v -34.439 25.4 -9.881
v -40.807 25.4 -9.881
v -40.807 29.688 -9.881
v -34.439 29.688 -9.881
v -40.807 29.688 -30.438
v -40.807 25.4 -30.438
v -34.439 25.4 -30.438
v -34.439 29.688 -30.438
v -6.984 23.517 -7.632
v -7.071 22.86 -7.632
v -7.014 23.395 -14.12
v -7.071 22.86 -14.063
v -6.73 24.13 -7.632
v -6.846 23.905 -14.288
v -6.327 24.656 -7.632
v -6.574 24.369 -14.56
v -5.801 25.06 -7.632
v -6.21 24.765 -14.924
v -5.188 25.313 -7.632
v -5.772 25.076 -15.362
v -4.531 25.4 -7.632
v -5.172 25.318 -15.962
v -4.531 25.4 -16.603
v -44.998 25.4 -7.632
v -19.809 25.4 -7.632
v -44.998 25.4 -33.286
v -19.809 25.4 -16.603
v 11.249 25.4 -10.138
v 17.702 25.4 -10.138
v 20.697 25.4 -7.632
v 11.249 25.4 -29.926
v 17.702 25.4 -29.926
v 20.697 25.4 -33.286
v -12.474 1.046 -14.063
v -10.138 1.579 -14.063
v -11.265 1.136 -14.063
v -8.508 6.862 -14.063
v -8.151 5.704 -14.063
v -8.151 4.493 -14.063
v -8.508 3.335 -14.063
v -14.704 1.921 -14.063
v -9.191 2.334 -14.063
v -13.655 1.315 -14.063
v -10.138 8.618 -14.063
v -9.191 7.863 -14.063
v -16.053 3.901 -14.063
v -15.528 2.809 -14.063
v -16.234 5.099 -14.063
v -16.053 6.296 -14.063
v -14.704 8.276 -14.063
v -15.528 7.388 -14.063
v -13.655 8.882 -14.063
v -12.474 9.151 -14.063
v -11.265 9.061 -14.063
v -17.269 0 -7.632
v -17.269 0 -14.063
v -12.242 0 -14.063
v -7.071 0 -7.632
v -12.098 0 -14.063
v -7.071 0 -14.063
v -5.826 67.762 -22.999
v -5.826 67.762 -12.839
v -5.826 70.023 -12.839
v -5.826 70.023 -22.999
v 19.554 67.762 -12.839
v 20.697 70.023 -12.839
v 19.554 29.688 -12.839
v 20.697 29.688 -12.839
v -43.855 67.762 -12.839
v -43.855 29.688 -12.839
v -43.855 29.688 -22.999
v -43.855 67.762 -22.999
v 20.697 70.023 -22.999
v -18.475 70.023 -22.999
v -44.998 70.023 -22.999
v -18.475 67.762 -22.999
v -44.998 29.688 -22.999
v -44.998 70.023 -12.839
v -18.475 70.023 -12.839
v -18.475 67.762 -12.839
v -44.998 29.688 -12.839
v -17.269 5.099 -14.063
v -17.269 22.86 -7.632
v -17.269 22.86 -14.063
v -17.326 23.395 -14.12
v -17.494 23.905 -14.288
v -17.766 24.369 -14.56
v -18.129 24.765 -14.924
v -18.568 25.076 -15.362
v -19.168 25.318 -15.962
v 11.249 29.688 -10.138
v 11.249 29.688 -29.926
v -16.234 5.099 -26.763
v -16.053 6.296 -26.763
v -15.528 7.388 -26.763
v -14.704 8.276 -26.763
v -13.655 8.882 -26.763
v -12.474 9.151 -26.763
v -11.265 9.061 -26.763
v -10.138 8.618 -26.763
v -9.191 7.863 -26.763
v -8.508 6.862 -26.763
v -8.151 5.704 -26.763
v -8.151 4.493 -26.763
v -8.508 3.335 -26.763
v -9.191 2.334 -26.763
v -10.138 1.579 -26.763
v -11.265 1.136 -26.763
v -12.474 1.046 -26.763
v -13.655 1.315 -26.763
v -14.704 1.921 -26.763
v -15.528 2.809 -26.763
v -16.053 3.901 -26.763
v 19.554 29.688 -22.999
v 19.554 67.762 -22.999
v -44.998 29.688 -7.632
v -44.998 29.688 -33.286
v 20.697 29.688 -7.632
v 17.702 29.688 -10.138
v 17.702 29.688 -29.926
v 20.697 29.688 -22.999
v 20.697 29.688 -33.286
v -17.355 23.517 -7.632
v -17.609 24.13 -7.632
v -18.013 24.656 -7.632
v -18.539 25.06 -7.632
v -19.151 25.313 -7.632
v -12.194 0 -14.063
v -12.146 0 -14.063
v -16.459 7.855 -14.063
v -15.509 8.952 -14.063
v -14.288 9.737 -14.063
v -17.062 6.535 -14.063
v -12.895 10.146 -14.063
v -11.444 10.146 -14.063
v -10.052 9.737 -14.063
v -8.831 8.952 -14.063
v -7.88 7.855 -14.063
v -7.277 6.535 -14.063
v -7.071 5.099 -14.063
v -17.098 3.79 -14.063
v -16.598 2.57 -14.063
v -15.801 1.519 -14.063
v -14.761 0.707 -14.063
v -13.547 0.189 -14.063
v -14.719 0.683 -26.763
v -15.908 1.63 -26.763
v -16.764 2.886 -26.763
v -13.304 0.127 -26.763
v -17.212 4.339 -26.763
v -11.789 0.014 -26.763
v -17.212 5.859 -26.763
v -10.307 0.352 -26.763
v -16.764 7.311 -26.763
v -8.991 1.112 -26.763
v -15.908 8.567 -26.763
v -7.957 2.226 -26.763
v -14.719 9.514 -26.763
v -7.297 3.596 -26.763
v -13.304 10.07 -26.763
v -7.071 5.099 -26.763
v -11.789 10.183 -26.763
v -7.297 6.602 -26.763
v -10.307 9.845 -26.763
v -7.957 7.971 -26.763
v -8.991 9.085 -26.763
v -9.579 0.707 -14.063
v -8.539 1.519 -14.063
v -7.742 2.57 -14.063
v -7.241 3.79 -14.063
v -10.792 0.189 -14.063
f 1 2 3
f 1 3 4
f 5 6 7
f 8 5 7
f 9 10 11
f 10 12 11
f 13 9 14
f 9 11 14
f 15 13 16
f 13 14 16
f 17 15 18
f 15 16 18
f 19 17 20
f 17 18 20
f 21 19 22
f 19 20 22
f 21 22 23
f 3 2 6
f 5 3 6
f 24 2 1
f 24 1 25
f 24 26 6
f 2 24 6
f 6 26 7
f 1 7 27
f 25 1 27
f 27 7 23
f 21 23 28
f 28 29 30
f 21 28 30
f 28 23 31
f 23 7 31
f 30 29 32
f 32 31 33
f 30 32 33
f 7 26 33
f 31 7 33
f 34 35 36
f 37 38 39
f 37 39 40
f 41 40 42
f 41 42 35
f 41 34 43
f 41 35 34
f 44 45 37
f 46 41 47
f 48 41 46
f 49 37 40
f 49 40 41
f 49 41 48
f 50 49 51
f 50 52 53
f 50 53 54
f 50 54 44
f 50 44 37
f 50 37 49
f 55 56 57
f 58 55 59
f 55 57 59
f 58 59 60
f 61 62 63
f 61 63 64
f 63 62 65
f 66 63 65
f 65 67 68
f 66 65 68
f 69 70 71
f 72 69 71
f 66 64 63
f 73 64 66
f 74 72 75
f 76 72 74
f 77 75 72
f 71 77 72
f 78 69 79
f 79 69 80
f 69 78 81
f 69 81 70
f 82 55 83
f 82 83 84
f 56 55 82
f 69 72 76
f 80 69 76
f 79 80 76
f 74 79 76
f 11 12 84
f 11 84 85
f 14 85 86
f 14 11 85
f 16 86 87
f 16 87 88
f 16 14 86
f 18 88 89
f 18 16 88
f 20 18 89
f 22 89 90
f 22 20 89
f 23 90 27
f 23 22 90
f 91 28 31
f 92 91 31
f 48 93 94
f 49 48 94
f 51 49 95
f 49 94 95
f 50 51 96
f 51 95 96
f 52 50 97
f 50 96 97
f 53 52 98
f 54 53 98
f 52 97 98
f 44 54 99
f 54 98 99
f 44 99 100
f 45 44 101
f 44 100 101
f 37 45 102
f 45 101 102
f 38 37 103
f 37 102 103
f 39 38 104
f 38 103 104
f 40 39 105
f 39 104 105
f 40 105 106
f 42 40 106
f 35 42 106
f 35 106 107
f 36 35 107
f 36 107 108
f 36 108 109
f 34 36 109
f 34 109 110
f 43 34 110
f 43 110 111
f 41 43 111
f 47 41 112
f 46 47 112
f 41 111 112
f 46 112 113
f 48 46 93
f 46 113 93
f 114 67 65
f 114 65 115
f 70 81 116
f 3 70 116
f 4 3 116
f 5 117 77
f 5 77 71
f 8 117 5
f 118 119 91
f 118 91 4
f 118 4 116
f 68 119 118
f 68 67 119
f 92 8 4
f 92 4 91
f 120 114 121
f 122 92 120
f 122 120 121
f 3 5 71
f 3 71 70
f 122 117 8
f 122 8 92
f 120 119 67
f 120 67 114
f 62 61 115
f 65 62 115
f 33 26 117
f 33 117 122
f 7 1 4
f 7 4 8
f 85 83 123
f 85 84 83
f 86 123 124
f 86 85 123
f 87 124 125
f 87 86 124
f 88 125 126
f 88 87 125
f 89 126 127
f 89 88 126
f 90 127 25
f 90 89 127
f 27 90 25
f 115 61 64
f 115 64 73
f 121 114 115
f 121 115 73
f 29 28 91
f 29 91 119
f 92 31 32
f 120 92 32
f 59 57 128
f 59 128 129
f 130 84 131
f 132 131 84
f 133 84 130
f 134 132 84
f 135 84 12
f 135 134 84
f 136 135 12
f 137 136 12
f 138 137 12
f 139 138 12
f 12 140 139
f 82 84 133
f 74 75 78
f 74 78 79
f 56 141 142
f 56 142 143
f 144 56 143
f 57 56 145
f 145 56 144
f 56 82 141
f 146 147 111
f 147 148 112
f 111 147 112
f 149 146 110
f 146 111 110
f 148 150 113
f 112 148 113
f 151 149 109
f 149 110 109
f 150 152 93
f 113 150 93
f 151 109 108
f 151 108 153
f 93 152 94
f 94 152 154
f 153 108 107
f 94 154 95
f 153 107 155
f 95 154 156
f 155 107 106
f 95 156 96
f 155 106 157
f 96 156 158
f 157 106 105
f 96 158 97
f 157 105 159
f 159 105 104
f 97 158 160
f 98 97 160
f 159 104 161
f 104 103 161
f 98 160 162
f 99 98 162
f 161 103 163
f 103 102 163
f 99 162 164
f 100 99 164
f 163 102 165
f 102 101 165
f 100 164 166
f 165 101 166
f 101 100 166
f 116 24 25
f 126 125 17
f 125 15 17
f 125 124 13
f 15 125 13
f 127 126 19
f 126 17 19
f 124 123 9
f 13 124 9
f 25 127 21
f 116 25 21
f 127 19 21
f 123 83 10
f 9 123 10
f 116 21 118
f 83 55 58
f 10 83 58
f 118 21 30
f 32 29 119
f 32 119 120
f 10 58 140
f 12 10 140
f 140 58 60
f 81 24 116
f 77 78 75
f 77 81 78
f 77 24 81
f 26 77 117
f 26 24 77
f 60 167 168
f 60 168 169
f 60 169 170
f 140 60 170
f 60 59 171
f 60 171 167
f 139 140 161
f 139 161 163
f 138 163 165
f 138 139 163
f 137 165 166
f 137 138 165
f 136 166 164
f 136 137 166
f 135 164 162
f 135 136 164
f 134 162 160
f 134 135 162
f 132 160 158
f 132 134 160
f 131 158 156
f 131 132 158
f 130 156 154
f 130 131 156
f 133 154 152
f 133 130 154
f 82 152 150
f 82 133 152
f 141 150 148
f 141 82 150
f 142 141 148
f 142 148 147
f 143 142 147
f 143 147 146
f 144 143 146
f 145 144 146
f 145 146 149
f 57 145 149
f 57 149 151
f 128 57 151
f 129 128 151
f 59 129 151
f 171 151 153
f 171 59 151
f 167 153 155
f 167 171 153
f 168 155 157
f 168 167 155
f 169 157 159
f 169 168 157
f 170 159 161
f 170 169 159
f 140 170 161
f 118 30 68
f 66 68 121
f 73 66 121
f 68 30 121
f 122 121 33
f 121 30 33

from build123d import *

# Parameters (mm, degrees)
SKETCH6_W            = 10.1981
SKETCH6_H            = 6.43128
BOSS_EXTRUDE3_DEPTH  = 25.4
SKETCH8_R            = 5.09905
BOSS_EXTRUDE5_DEPTH  = 12.7
SKETCH11_W           = 65.69456
SKETCH11_H           = 25.654
SKETCH11_W_2         = 6.368021248
SKETCH11_H_2         = 20.557169264
SKETCH11_W_3         = 6.453498043
SKETCH11_H_3         = 19.787878106
BOSS_EXTRUDE10_DEPTH = 4.28752
SKETCH16_W           = 1.143
SKETCH16_H           = 10.16
BOSS_EXTRUDE11_DEPTH = 38.0746
SKETCH17_W           = 26.52268
SKETCH17_H           = 10.16
BOSS_EXTRUDE12_DEPTH = 2.2606
FILLET2_R            = 2.54
FILLET3_R            = 2.54
FILLET4_R            = 2.54
SKETCH19_R           = 4.064
CUT_EXTRUDE1_DEPTH   = 12.7


with BuildPart() as part:
    # Sketch6 → Boss-Extrude3 (new body)
    with BuildSketch(Plane(origin=(0, 0, 0), x_dir=(1, 0, 0), z_dir=(0, 1, 0))):
        with Locations((-12.169797761, 10.84768804)):
            Rectangle(SKETCH6_W, SKETCH6_H)
    extrude(amount=BOSS_EXTRUDE3_DEPTH)

    # Sketch8 → Boss-Extrude5 (add)
    with BuildSketch(Plane.XY.offset(-14.06332804)):
        with Locations((-12.169797761, 5.098542)):
            Circle(SKETCH8_R)
    extrude(amount=-BOSS_EXTRUDE5_DEPTH)

    # Sketch11 → Boss-Extrude10 (add)
    with BuildSketch(Plane(origin=(0, 25.4, 0), x_dir=(1, 0, 0), z_dir=(0, 1, 0))):
        with Locations((-12.150747761, 20.45904804)):
            Rectangle(SKETCH11_W, SKETCH11_H)
        with Locations((-37.622832753, 20.159879257)):
            Rectangle(SKETCH11_W_2, SKETCH11_H_2, mode=Mode.SUBTRACT)
        with Locations((14.475273968, 20.031664064)):
            Rectangle(SKETCH11_W_3, SKETCH11_H_3, mode=Mode.SUBTRACT)
    extrude(amount=BOSS_EXTRUDE10_DEPTH)

    # Sketch16 → Boss-Extrude11 (add)
    with BuildSketch(Plane(origin=(0, 29.68752, 0), x_dir=(1, 0, 0), z_dir=(0, 1, 0))):
        with Locations((-44.426527761, 17.91904804)):
            Rectangle(SKETCH16_W, SKETCH16_H)
        with Locations((20.125032239, 17.91904804)):
            Rectangle(SKETCH16_W, SKETCH16_H)
    extrude(amount=BOSS_EXTRUDE11_DEPTH)

    # Sketch17 → Boss-Extrude12 (add)
    with BuildSketch(Plane(origin=(0, 67.76212, 0), x_dir=(1, 0, 0), z_dir=(0, 1, 0))):
        with Locations((-31.736687761, 17.91904804)):
            Rectangle(SKETCH17_W, SKETCH17_H)
        with Locations((7.435192239, 17.91904804)):
            Rectangle(SKETCH17_W, SKETCH17_H)
    extrude(amount=BOSS_EXTRUDE12_DEPTH)

    # Fillet2
    fillet2_edges = [part.edges().sort_by_distance(p)[0] for p in [
        (-12.169797761, 25.4, -14.06332804),
    ]]
    fillet(fillet2_edges, radius=FILLET2_R)

    # Fillet3
    fillet3_edges = [part.edges().sort_by_distance(p)[0] for p in [
        (-17.268847761, 25.4, -12.11768804),
    ]]
    fillet(fillet3_edges, radius=FILLET3_R)

    # Fillet4
    fillet4_edges = [part.edges().sort_by_distance(p)[0] for p in [
        (-7.070747761, 25.4, -12.11768804),
    ]]
    fillet(fillet4_edges, radius=FILLET4_R)

    # Sketch19 → Cut-Extrude1 (cut)
    with BuildSketch(Plane(origin=(0, 0, -26.76332804), x_dir=(-1, 0, 0), z_dir=(0, 0, -1))):
        with Locations((12.169797761, 5.098542)):
            Circle(SKETCH19_R)
    extrude(amount=-CUT_EXTRUDE1_DEPTH, mode=Mode.SUBTRACT)


solid = part.part
